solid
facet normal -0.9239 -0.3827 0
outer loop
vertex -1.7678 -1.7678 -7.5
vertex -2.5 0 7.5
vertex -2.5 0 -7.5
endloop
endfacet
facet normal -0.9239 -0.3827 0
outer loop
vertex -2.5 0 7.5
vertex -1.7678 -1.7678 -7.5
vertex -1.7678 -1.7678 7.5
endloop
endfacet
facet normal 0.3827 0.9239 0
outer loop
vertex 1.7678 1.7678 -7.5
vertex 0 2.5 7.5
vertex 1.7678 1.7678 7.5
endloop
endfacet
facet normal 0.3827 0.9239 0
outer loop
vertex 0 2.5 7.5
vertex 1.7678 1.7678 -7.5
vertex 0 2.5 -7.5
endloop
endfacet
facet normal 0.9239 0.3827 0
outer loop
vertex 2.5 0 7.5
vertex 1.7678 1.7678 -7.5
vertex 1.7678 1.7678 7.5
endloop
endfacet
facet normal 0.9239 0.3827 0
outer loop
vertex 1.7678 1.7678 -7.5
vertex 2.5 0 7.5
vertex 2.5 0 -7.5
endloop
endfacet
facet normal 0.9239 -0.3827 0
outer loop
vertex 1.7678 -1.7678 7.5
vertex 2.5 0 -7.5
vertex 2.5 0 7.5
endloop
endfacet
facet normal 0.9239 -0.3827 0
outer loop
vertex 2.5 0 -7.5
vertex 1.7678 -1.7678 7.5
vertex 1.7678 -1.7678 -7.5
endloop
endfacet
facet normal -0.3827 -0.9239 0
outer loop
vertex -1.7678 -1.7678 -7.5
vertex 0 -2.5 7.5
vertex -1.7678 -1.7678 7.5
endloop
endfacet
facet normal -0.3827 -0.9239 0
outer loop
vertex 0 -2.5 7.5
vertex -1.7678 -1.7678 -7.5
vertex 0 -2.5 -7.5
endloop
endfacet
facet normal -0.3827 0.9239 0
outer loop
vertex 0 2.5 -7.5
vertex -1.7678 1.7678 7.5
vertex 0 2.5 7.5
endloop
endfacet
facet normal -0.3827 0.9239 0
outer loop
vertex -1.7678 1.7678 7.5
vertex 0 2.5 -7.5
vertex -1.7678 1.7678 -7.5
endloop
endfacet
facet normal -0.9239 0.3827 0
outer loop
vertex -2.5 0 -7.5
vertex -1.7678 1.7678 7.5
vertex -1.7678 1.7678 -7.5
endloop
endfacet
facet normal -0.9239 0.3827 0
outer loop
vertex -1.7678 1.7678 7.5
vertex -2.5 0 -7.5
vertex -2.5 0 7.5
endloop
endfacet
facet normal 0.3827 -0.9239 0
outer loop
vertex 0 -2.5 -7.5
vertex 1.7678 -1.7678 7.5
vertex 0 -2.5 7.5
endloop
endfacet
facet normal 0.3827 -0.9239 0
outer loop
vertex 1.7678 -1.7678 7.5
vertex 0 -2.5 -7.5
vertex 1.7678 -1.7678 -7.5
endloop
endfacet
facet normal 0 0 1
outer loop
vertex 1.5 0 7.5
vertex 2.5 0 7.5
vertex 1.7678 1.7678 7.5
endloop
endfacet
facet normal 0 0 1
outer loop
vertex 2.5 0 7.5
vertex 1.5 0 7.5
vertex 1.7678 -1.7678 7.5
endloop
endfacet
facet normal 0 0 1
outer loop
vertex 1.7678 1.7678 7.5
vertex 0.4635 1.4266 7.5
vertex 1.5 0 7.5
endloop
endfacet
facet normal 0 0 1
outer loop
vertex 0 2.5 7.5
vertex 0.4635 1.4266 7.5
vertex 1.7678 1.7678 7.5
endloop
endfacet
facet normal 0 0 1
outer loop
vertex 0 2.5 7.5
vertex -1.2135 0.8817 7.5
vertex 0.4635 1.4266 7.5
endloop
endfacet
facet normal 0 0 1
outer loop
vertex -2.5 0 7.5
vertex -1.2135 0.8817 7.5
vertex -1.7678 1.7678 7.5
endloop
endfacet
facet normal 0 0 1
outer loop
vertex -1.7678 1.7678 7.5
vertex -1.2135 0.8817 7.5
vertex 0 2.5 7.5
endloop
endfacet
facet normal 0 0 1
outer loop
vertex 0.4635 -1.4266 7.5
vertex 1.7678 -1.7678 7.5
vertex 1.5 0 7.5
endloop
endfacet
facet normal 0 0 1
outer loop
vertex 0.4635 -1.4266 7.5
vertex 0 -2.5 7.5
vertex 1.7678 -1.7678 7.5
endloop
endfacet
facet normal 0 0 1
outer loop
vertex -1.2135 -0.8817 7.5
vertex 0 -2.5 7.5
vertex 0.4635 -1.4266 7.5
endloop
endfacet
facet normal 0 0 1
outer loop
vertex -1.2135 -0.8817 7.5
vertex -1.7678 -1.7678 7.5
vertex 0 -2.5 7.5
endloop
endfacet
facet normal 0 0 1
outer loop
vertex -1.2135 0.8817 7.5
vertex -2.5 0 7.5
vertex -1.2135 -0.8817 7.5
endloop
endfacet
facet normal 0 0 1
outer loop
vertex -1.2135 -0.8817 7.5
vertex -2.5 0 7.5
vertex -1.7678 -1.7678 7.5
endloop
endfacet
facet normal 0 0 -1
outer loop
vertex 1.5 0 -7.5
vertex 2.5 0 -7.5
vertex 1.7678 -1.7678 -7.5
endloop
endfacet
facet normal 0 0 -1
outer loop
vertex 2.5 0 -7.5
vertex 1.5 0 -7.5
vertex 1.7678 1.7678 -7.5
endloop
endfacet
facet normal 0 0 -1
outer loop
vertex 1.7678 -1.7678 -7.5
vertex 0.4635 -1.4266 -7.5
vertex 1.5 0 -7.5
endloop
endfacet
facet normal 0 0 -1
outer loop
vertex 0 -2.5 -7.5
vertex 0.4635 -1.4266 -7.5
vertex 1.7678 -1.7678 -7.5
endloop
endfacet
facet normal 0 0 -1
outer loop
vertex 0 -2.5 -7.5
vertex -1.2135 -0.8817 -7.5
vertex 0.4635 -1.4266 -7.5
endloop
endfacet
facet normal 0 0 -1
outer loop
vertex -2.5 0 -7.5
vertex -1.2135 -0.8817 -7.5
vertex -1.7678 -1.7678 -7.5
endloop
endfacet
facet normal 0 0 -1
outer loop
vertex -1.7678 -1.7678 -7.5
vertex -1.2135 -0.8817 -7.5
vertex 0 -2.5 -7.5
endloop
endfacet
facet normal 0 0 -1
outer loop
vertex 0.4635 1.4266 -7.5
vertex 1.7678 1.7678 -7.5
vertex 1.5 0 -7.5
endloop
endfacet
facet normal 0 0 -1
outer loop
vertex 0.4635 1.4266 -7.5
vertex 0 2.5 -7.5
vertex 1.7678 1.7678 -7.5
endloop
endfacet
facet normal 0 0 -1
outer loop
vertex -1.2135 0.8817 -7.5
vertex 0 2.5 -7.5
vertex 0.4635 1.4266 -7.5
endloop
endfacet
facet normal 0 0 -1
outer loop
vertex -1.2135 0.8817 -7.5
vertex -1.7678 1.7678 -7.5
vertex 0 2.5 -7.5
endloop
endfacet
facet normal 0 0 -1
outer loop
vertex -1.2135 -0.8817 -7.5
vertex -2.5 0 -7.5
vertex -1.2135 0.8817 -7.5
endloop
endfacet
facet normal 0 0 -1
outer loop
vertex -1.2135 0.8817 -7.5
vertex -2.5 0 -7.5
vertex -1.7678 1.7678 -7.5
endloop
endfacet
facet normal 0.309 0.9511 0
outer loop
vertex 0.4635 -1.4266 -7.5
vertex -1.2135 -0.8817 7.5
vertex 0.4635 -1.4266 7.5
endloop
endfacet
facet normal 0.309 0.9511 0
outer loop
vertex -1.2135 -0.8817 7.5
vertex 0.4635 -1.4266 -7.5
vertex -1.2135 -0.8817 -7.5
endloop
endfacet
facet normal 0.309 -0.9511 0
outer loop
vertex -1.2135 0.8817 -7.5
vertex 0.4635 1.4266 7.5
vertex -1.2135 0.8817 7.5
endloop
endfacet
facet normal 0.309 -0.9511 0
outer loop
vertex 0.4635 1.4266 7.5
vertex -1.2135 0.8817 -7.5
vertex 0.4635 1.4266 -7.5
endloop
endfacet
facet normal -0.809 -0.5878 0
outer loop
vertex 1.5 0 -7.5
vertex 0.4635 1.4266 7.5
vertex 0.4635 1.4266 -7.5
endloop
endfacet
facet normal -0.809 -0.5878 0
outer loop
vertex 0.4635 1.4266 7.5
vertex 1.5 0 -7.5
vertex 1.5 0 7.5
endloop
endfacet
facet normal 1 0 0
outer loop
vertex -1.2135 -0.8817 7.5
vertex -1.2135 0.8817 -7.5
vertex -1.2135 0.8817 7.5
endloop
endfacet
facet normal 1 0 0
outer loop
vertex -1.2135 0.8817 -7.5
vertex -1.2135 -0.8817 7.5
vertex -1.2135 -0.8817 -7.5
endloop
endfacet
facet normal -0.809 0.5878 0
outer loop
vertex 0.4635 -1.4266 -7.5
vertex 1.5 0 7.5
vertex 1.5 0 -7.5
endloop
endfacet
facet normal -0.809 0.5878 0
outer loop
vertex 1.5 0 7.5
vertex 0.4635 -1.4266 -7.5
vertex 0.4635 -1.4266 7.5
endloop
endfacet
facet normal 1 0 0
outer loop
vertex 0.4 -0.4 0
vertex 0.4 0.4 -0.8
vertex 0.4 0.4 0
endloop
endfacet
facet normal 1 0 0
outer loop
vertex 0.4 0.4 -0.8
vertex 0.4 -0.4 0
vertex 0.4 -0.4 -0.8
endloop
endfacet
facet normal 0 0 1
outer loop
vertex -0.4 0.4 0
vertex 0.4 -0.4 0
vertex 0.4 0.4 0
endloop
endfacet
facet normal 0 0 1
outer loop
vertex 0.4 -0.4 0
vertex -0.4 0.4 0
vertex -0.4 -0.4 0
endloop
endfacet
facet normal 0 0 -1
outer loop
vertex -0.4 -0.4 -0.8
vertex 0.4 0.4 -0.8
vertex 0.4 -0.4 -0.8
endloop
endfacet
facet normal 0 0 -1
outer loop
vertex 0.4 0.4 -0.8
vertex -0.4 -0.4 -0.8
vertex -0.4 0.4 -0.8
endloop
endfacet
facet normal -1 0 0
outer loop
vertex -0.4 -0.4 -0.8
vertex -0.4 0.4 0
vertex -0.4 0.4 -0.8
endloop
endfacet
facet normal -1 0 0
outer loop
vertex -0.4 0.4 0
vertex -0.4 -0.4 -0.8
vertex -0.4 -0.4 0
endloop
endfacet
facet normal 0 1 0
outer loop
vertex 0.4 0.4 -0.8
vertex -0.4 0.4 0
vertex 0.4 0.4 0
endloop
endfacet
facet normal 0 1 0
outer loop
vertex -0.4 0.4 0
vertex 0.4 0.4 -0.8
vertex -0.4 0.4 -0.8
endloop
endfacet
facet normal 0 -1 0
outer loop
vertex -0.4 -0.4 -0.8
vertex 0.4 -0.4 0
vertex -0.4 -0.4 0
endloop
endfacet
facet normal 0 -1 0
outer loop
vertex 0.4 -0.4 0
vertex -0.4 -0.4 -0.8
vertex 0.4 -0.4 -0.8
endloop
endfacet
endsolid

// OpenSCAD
// Parameters
length = 15; //[8:30:1]
forced_id = 0; //[0:20:1]
tubing_nominal_id = 3; //[1.5:6:0.1]
tubing_nominal_od = 5; //[2.5:10:0.1]
eps_overlap = 0.8; //[0.5:2:0.1]

// Tubing - complete detailed geometry
module tubing() {
  color([0.85, 0.85, 0.8]) { // Off-white for heatshrink
    difference() {
      // Outer cylinder
      cylinder(
        r=((forced_id > 0 ? forced_id : tubing_nominal_id) + (tubing_nominal_od - tubing_nominal_id)) / 2,
        h=length,
        center=true
      );
      // Inner cylinder
      cylinder(
        r=(forced_id > 0 ? forced_id : tubing_nominal_id) / 2,
        h=length + 2 * eps_overlap,
        center=true
      );
    }
  }
}

// Sleeved Resistor - complete detailed geometry
module sleeved_resistor() {
  color([0.2, 0.2, 0.2]) { // Dark color for resistor
    // Resistor body
    translate([0, 0, -eps_overlap/2])
      cube([eps_overlap, eps_overlap, eps_overlap], center=true);
  }
}

// Assembly
module assembly() {
  tubing();
  translate([0, 0, 0]) sleeved_resistor();
}

assembly();
